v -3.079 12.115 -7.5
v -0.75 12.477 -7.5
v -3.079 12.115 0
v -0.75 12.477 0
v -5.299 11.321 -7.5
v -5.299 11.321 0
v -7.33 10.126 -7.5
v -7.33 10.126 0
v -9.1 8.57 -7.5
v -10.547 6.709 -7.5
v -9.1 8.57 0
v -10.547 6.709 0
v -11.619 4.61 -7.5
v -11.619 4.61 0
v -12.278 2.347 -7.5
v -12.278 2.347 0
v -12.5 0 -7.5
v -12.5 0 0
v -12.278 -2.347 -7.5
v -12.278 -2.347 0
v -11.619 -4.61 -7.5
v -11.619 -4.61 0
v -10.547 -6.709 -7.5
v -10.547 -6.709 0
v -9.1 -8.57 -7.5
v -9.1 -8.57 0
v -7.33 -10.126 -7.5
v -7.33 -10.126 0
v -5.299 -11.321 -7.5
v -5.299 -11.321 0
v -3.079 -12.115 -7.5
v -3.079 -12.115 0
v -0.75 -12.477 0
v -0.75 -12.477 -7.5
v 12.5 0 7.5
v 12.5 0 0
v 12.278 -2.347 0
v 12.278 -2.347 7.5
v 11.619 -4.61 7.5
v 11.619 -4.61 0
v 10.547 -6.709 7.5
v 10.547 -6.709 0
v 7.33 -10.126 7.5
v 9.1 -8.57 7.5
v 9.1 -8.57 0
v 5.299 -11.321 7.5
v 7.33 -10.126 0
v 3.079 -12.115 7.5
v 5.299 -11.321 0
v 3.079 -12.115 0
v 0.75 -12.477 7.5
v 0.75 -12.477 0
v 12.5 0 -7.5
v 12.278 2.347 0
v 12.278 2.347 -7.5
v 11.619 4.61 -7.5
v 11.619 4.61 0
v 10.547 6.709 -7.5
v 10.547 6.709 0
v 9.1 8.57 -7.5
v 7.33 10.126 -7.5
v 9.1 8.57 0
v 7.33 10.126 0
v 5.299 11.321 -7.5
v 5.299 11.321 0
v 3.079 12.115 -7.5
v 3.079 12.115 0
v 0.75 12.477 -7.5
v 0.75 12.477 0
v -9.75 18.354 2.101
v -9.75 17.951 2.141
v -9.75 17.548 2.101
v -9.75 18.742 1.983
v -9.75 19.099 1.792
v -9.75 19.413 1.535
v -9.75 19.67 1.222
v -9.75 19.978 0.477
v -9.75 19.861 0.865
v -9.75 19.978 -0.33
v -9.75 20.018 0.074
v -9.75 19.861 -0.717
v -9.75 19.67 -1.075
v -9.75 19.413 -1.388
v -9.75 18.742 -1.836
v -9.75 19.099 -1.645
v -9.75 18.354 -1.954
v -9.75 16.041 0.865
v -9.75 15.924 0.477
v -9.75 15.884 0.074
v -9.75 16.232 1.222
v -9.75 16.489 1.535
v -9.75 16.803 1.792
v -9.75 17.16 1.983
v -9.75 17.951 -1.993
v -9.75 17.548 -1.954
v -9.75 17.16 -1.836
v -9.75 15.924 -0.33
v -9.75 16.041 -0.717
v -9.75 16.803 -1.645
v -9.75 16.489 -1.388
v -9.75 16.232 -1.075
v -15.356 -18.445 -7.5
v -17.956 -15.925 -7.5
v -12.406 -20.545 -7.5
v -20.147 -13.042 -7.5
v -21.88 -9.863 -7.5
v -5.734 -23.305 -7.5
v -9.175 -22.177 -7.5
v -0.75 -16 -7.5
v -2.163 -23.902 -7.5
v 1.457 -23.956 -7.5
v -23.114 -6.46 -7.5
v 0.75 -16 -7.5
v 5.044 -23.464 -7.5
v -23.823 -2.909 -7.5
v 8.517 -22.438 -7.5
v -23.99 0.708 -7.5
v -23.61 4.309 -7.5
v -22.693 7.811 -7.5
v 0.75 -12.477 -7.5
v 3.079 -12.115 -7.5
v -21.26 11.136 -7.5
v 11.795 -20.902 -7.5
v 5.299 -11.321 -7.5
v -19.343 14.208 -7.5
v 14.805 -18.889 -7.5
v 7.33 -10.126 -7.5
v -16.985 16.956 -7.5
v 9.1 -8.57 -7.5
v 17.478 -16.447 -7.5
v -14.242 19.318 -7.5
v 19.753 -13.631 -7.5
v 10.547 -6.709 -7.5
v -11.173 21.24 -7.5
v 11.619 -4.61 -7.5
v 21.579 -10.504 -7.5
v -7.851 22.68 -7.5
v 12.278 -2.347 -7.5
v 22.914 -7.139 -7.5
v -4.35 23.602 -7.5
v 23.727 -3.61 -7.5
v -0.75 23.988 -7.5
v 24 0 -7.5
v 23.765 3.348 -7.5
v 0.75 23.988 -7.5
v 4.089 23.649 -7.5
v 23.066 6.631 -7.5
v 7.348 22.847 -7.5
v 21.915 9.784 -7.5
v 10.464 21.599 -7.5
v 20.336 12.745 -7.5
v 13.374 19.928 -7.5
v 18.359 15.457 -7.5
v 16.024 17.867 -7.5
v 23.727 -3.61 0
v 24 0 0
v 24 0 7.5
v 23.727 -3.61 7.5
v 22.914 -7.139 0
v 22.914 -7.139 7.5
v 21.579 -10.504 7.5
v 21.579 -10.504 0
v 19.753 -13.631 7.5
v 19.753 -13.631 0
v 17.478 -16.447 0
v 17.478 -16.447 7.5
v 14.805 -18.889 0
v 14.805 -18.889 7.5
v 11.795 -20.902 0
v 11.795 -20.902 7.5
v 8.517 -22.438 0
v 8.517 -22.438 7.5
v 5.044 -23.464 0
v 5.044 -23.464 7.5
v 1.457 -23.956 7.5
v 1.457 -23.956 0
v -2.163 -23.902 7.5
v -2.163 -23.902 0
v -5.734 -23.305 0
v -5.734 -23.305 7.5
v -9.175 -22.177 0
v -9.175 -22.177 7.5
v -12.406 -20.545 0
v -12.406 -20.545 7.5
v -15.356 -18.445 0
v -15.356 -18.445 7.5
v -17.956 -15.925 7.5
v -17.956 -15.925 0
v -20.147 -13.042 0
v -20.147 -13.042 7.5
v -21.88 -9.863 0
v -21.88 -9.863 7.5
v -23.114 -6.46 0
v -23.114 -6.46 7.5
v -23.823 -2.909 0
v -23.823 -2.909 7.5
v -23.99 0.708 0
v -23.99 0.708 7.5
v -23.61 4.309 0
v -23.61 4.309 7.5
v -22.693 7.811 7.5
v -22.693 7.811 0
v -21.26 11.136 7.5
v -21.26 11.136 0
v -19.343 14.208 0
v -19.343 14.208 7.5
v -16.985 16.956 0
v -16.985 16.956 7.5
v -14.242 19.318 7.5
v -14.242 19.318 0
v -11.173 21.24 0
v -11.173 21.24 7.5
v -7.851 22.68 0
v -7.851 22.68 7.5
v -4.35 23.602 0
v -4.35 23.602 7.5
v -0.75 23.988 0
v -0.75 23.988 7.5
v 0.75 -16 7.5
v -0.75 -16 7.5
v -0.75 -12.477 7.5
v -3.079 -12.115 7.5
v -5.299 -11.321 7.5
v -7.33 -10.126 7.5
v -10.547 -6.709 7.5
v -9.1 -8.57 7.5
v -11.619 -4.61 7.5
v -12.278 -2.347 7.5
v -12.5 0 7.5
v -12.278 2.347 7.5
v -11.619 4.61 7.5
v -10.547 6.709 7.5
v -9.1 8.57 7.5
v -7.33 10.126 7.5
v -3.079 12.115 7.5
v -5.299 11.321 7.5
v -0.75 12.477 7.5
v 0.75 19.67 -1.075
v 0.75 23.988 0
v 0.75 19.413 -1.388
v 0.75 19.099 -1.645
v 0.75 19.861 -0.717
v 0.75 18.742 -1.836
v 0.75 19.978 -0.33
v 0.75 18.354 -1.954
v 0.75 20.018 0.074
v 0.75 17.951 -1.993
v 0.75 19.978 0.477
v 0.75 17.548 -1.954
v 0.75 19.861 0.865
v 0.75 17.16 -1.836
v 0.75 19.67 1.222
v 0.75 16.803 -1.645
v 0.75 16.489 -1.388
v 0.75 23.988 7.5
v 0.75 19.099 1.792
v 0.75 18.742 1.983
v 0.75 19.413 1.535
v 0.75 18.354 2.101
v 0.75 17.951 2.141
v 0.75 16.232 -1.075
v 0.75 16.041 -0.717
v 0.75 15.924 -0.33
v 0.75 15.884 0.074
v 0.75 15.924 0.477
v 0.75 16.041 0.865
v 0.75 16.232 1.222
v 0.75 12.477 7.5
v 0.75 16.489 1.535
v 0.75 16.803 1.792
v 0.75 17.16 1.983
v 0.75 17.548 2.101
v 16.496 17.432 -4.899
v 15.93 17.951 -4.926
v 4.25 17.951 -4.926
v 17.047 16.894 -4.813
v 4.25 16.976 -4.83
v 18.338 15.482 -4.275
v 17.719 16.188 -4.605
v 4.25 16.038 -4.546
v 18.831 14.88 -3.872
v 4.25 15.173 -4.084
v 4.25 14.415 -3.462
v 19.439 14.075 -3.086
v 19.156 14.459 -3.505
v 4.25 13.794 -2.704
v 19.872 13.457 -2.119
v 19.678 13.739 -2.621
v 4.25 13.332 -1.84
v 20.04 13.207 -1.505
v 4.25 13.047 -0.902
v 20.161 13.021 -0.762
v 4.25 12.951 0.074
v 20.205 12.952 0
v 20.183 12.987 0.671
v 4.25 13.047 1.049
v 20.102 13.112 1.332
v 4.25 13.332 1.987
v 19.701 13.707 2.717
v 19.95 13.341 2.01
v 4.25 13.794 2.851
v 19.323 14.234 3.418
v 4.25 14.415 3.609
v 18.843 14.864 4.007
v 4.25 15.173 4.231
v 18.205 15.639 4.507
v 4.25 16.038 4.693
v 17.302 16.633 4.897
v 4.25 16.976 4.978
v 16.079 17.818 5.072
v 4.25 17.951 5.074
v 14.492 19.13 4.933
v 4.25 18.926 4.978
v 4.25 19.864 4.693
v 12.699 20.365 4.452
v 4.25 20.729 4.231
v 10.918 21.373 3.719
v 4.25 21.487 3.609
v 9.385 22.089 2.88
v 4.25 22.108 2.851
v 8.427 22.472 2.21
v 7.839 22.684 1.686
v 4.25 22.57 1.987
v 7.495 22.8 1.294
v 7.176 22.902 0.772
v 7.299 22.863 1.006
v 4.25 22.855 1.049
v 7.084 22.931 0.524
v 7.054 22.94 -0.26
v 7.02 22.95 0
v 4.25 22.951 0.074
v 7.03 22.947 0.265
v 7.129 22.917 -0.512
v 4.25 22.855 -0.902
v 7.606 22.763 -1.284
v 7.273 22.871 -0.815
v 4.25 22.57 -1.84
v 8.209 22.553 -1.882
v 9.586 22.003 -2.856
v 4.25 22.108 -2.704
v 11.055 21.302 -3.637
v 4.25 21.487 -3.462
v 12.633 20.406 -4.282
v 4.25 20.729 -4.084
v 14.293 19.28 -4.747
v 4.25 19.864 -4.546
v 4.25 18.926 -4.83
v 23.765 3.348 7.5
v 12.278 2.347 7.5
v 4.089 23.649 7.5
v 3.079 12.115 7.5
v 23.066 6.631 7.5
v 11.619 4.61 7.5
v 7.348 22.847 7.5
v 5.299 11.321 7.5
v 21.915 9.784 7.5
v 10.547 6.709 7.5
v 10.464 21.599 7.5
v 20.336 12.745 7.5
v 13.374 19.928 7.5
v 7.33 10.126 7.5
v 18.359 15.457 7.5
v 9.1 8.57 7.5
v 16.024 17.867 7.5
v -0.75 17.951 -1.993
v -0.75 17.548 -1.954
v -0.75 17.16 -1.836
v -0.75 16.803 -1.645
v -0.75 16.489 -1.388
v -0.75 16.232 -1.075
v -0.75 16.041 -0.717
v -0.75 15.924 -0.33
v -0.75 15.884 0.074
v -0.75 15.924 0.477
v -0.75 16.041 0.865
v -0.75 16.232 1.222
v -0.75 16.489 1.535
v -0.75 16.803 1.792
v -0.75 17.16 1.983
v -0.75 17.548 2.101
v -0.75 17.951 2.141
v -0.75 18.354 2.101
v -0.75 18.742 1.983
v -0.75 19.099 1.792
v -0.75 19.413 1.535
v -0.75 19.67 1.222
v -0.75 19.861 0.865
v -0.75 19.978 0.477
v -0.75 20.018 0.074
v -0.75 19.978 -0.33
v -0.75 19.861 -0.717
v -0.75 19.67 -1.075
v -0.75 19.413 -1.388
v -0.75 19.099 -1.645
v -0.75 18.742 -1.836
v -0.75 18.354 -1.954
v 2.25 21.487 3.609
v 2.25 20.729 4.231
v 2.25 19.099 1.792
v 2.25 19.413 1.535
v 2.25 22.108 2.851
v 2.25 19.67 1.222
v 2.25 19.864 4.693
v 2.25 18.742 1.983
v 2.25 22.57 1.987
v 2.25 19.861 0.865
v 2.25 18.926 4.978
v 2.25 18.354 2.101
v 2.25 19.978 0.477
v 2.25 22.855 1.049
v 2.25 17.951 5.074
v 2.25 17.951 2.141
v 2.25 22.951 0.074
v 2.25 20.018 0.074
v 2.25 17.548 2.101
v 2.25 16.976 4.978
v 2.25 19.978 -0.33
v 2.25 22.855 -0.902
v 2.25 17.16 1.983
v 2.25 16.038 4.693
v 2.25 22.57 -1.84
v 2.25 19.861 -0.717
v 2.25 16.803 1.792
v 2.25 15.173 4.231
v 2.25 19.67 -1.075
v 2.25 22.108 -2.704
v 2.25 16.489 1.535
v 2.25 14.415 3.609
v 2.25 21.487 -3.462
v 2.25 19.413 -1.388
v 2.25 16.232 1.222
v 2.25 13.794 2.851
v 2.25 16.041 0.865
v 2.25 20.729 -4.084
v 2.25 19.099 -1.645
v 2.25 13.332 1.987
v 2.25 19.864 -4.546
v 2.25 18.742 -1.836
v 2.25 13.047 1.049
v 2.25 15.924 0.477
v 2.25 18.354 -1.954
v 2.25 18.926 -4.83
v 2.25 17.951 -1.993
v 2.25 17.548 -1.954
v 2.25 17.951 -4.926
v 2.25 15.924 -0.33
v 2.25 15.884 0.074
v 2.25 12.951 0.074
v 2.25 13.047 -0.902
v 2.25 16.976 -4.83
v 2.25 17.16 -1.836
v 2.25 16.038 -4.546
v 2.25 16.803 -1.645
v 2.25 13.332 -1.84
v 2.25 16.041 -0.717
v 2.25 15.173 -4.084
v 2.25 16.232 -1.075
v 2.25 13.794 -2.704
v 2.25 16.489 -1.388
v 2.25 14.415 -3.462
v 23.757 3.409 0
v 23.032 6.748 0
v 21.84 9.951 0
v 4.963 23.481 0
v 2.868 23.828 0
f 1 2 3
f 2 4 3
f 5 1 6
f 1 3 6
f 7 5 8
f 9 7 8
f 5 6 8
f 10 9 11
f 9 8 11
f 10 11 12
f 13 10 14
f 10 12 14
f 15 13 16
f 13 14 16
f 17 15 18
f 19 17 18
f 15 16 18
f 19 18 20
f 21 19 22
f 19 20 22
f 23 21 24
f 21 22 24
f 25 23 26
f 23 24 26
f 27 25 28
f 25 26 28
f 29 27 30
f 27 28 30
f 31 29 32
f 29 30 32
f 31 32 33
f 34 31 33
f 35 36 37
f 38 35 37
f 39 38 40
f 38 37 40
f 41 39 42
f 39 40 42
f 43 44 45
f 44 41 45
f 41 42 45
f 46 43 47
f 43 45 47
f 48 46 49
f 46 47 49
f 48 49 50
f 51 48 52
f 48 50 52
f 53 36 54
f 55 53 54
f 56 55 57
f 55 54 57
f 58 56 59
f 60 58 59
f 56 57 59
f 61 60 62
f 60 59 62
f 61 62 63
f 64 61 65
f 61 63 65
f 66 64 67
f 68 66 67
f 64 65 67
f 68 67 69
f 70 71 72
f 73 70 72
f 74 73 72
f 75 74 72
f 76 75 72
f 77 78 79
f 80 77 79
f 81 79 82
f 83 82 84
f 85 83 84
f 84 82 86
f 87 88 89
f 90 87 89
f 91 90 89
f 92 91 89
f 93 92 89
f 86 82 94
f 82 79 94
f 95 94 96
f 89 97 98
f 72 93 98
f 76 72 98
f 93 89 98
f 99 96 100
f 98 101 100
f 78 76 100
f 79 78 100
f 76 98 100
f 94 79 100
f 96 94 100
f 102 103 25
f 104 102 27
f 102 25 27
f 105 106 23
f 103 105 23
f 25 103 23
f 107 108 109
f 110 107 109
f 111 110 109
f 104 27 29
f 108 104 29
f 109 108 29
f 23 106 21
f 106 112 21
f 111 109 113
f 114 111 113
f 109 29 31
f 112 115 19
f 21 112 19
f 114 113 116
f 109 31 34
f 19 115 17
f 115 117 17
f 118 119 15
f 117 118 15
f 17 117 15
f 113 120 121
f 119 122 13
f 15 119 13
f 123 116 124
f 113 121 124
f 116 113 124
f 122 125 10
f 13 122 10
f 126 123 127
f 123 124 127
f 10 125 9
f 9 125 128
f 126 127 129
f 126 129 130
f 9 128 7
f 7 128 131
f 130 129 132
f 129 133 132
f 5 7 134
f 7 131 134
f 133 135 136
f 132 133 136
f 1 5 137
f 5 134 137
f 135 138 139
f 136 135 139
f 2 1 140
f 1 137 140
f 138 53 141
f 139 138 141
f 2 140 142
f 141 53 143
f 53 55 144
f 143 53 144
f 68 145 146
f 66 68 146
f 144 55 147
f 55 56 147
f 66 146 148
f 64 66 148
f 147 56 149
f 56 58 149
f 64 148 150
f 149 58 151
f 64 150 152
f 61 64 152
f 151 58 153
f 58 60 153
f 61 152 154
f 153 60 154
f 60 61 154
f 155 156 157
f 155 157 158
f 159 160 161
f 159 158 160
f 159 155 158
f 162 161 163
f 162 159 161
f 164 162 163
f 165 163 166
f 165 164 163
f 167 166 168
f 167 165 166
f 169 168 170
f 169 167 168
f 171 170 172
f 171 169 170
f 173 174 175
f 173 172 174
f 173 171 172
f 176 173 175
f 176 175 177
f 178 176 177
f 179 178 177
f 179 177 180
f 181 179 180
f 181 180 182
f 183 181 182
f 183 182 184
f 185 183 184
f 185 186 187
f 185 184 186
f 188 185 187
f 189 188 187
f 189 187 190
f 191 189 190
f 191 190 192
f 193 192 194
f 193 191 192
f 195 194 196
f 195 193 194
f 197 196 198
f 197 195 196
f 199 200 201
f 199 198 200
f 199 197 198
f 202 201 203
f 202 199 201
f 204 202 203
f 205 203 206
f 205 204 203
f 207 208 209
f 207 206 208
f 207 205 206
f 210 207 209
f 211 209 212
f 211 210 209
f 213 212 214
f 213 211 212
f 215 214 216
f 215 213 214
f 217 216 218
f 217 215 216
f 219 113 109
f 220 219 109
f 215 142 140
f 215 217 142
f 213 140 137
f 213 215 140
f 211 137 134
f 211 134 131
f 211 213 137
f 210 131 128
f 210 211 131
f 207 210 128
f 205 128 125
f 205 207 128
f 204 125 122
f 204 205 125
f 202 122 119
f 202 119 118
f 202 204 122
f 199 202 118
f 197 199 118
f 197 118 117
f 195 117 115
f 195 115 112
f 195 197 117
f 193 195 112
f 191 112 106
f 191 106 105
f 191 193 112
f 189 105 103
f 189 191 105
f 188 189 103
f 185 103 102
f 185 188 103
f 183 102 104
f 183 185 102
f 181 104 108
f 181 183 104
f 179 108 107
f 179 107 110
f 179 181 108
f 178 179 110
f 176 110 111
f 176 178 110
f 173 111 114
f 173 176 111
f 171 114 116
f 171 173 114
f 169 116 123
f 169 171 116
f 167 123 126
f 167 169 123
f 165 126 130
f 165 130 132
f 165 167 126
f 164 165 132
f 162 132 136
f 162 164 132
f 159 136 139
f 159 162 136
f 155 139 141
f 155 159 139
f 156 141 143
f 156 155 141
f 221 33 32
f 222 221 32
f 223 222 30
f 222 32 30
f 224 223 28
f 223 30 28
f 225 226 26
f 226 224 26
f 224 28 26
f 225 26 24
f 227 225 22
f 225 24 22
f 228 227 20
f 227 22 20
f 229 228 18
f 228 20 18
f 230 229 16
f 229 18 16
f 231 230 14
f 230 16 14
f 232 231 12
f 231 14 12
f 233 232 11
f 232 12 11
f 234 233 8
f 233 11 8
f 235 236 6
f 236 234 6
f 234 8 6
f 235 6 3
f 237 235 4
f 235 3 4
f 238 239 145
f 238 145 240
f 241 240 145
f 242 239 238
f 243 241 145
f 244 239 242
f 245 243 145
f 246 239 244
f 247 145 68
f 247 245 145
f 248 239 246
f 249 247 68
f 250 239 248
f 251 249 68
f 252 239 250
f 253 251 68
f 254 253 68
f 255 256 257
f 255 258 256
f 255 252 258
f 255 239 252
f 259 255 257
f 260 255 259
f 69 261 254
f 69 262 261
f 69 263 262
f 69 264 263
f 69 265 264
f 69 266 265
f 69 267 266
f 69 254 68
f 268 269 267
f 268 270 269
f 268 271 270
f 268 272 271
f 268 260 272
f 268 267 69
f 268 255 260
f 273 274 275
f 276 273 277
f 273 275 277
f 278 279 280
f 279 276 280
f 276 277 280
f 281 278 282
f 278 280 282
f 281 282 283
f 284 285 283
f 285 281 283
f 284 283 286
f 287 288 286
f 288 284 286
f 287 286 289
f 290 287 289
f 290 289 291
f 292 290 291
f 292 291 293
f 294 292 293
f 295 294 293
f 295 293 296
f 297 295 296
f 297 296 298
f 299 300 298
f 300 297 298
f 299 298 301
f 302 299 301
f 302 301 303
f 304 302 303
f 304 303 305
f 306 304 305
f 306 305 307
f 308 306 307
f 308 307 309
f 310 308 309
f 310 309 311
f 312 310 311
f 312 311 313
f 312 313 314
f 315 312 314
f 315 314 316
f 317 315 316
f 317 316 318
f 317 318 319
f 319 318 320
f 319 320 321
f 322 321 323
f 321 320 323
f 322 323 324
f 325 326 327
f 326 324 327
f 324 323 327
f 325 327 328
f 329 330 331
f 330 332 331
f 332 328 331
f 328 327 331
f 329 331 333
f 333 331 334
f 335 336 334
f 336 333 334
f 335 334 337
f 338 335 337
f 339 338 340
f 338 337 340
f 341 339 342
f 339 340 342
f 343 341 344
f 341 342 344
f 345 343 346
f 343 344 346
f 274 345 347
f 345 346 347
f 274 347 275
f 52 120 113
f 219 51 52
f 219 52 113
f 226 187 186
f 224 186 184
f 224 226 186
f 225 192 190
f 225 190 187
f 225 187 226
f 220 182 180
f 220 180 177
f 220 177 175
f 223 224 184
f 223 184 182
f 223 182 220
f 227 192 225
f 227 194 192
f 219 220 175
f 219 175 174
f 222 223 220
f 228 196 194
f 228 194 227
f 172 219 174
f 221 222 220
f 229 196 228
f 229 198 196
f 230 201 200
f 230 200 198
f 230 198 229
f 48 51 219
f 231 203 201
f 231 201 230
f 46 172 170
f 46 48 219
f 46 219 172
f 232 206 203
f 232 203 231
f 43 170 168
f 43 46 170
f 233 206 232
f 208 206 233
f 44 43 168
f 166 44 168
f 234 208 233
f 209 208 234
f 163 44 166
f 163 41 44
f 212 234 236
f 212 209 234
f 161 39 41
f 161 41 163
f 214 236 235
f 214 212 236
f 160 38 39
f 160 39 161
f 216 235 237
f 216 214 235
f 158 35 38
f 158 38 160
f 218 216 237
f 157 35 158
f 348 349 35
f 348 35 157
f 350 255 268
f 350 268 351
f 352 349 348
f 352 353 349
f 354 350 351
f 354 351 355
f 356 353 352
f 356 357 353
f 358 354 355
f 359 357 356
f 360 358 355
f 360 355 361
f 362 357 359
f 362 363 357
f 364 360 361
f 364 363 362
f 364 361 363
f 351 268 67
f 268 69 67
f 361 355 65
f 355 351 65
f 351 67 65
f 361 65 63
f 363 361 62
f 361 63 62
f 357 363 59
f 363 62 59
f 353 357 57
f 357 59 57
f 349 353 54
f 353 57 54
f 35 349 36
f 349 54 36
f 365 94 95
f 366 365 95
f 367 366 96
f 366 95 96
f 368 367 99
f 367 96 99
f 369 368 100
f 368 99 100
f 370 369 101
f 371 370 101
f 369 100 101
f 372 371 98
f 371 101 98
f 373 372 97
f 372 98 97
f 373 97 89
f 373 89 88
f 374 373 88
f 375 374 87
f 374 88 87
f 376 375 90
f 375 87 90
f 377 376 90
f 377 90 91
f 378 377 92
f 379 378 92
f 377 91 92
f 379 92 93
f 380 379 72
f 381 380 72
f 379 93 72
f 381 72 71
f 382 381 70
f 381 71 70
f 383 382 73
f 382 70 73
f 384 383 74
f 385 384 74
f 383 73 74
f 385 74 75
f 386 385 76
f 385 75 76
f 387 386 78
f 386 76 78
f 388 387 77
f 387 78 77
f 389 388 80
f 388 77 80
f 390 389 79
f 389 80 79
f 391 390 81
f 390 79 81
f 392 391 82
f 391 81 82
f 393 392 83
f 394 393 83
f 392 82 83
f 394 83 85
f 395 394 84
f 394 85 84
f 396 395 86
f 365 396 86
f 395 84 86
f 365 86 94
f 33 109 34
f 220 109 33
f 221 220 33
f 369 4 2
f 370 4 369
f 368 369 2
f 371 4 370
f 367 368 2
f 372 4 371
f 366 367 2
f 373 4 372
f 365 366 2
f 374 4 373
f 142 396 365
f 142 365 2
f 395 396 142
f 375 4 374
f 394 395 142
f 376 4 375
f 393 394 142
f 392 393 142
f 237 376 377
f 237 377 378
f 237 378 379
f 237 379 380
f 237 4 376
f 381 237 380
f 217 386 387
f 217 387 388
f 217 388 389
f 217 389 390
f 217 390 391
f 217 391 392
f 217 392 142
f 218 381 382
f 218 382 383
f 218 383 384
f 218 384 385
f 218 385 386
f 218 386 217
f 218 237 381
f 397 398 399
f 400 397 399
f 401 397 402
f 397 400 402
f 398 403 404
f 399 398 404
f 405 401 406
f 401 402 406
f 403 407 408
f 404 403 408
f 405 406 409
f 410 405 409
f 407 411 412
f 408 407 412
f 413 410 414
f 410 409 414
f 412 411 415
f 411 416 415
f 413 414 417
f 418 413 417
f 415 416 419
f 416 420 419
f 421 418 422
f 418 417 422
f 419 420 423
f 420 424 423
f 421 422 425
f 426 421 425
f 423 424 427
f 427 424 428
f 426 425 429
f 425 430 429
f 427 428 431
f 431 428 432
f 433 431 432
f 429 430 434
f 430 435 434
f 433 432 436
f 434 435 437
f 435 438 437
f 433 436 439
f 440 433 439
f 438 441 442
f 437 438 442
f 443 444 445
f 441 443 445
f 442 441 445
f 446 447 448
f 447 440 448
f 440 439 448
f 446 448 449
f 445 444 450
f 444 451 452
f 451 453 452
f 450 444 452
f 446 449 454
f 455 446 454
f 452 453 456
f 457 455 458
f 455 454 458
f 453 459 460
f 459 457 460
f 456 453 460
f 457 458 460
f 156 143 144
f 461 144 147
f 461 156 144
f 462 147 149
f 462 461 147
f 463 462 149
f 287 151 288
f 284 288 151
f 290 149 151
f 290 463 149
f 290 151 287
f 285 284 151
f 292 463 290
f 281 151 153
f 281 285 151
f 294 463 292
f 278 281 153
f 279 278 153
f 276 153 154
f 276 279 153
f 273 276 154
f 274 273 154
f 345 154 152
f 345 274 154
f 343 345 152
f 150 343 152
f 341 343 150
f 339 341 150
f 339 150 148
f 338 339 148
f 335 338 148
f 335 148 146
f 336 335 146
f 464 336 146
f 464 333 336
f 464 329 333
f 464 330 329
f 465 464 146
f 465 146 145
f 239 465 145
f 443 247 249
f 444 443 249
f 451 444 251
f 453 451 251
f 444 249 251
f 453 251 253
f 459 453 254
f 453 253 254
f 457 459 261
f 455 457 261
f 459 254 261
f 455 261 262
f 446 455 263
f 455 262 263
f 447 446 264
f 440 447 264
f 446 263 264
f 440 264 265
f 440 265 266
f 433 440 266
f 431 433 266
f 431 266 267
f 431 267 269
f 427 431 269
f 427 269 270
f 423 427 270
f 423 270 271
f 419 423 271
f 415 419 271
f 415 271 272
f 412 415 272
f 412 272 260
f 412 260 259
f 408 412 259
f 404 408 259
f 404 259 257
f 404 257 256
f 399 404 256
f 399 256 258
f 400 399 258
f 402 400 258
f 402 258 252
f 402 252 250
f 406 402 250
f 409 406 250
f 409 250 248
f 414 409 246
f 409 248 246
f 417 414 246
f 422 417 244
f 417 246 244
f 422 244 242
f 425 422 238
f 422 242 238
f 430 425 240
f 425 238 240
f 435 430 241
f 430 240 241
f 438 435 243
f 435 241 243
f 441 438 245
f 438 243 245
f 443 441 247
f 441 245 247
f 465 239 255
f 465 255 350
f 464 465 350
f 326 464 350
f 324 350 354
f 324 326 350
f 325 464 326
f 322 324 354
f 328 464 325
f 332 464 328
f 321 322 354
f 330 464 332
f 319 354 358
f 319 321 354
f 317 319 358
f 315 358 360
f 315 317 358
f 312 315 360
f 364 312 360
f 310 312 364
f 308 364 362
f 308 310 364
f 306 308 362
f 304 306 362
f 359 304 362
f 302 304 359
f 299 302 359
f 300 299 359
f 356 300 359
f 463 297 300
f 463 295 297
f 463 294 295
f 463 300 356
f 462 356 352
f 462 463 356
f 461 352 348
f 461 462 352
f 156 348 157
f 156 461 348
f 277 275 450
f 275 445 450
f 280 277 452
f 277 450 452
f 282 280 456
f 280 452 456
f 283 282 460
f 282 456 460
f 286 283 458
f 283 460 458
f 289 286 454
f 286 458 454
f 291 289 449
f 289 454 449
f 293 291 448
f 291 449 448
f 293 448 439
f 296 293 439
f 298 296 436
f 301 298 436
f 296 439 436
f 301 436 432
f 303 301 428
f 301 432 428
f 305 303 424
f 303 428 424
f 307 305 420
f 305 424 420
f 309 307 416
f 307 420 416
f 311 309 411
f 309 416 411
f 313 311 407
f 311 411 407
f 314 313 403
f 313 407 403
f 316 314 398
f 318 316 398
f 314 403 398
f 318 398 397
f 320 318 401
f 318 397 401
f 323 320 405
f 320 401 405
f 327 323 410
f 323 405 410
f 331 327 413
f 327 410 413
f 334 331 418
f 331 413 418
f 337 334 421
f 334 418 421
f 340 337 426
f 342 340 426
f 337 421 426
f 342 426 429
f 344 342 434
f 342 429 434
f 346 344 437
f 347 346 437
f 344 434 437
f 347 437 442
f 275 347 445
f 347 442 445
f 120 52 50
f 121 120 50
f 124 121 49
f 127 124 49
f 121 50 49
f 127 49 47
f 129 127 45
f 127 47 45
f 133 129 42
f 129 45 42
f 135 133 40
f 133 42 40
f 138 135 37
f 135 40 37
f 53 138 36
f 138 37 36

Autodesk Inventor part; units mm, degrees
ref_plane "YZ Plane" through (0, 0, 0) normal (1, 0, 0) x (0, 1, 0)
ref_plane "XZ Plane" through (0, 0, 0) normal (0, 1, 0) x (-1, 0, 0)
sketch "Esquisse1" plane through (0, 0, 0) normal (0, 0, 1) x (1, 0, 0)
  circle A0 centre (0, 0) radius 12.5
  circle A1 centre (0, 0) radius 24
  dimension "d0" = 25
  dimension "d1" = 48
extrude "Extrusion1" add sketch "Esquisse1" along normal mid plane 15
sketch "Esquisse2" plane through (0, 0, 7.5) normal (0, 0, 1) x (1, 0, 0)
  line L0 (-0.75, 24) -> (0.75, 24)
  line L1 (0.75, 24) -> (0.75, -16)
  line L2 (0.75, -16) -> (-0.75, -16)
  line L3 (-0.75, -16) -> (-0.75, 24)
  line L4 (-0.75, 24) -> (0.75, -16) construction
  line L5 (0.75, 24) -> (-0.75, -16) construction
  circle A0 centre (0, 0) radius 24 projected
  point P0 (0, 4)
  dimension "d4" = 1.5
  dimension "d5" = 40
extrude "Extrusion2" cut sketch "Esquisse2" against normal through all contours L0 A0 L3 | L0 L1 A0 | A0 L1 L2 L3 picked at (0, -2.6667)
ref_plane "Plan de construction1" through (4.25, 12.4775, 7.5) normal (1, 0, 0) x (0, 0, -1)
sketch "Esquisse3" plane through (4.25, 12.4775, 7.5) normal (1, 0, 0) x (0, 0, -1)
  line L0 (0, 11.5108) -> (15, 11.5108) projected
  line L1 (0, 0) -> (0, 11.5108) projected
  line L2 (15, 0) -> (0, 0) projected
  line L3 (15, 11.5108) -> (15, 0) projected
  point P0 (7.5, -12.4775)
  point P1 (7.4264, 5.4735)
hole "Perçage1" at (4.25, 17.951, 0.0736) direction (-1, 0, 0) diameter 4.134 depth 14 counterbore diameter 10 counterbore depth 2 thread size "M5x0.8" class "6H" standard "ISO Metric profile"
sketch "Esquisse4" plane through (4.25, 12.4775, 7.5) normal (1, 0, 0) x (0, 0, -1)
  circle A0 centre (7.4264, 5.4735) radius 5 projected
  point P0 (7.5, -12.4775)
extrude "Extrusion3" cut sketch "Esquisse4" along normal through all
properties part number "BagueSerrage"
